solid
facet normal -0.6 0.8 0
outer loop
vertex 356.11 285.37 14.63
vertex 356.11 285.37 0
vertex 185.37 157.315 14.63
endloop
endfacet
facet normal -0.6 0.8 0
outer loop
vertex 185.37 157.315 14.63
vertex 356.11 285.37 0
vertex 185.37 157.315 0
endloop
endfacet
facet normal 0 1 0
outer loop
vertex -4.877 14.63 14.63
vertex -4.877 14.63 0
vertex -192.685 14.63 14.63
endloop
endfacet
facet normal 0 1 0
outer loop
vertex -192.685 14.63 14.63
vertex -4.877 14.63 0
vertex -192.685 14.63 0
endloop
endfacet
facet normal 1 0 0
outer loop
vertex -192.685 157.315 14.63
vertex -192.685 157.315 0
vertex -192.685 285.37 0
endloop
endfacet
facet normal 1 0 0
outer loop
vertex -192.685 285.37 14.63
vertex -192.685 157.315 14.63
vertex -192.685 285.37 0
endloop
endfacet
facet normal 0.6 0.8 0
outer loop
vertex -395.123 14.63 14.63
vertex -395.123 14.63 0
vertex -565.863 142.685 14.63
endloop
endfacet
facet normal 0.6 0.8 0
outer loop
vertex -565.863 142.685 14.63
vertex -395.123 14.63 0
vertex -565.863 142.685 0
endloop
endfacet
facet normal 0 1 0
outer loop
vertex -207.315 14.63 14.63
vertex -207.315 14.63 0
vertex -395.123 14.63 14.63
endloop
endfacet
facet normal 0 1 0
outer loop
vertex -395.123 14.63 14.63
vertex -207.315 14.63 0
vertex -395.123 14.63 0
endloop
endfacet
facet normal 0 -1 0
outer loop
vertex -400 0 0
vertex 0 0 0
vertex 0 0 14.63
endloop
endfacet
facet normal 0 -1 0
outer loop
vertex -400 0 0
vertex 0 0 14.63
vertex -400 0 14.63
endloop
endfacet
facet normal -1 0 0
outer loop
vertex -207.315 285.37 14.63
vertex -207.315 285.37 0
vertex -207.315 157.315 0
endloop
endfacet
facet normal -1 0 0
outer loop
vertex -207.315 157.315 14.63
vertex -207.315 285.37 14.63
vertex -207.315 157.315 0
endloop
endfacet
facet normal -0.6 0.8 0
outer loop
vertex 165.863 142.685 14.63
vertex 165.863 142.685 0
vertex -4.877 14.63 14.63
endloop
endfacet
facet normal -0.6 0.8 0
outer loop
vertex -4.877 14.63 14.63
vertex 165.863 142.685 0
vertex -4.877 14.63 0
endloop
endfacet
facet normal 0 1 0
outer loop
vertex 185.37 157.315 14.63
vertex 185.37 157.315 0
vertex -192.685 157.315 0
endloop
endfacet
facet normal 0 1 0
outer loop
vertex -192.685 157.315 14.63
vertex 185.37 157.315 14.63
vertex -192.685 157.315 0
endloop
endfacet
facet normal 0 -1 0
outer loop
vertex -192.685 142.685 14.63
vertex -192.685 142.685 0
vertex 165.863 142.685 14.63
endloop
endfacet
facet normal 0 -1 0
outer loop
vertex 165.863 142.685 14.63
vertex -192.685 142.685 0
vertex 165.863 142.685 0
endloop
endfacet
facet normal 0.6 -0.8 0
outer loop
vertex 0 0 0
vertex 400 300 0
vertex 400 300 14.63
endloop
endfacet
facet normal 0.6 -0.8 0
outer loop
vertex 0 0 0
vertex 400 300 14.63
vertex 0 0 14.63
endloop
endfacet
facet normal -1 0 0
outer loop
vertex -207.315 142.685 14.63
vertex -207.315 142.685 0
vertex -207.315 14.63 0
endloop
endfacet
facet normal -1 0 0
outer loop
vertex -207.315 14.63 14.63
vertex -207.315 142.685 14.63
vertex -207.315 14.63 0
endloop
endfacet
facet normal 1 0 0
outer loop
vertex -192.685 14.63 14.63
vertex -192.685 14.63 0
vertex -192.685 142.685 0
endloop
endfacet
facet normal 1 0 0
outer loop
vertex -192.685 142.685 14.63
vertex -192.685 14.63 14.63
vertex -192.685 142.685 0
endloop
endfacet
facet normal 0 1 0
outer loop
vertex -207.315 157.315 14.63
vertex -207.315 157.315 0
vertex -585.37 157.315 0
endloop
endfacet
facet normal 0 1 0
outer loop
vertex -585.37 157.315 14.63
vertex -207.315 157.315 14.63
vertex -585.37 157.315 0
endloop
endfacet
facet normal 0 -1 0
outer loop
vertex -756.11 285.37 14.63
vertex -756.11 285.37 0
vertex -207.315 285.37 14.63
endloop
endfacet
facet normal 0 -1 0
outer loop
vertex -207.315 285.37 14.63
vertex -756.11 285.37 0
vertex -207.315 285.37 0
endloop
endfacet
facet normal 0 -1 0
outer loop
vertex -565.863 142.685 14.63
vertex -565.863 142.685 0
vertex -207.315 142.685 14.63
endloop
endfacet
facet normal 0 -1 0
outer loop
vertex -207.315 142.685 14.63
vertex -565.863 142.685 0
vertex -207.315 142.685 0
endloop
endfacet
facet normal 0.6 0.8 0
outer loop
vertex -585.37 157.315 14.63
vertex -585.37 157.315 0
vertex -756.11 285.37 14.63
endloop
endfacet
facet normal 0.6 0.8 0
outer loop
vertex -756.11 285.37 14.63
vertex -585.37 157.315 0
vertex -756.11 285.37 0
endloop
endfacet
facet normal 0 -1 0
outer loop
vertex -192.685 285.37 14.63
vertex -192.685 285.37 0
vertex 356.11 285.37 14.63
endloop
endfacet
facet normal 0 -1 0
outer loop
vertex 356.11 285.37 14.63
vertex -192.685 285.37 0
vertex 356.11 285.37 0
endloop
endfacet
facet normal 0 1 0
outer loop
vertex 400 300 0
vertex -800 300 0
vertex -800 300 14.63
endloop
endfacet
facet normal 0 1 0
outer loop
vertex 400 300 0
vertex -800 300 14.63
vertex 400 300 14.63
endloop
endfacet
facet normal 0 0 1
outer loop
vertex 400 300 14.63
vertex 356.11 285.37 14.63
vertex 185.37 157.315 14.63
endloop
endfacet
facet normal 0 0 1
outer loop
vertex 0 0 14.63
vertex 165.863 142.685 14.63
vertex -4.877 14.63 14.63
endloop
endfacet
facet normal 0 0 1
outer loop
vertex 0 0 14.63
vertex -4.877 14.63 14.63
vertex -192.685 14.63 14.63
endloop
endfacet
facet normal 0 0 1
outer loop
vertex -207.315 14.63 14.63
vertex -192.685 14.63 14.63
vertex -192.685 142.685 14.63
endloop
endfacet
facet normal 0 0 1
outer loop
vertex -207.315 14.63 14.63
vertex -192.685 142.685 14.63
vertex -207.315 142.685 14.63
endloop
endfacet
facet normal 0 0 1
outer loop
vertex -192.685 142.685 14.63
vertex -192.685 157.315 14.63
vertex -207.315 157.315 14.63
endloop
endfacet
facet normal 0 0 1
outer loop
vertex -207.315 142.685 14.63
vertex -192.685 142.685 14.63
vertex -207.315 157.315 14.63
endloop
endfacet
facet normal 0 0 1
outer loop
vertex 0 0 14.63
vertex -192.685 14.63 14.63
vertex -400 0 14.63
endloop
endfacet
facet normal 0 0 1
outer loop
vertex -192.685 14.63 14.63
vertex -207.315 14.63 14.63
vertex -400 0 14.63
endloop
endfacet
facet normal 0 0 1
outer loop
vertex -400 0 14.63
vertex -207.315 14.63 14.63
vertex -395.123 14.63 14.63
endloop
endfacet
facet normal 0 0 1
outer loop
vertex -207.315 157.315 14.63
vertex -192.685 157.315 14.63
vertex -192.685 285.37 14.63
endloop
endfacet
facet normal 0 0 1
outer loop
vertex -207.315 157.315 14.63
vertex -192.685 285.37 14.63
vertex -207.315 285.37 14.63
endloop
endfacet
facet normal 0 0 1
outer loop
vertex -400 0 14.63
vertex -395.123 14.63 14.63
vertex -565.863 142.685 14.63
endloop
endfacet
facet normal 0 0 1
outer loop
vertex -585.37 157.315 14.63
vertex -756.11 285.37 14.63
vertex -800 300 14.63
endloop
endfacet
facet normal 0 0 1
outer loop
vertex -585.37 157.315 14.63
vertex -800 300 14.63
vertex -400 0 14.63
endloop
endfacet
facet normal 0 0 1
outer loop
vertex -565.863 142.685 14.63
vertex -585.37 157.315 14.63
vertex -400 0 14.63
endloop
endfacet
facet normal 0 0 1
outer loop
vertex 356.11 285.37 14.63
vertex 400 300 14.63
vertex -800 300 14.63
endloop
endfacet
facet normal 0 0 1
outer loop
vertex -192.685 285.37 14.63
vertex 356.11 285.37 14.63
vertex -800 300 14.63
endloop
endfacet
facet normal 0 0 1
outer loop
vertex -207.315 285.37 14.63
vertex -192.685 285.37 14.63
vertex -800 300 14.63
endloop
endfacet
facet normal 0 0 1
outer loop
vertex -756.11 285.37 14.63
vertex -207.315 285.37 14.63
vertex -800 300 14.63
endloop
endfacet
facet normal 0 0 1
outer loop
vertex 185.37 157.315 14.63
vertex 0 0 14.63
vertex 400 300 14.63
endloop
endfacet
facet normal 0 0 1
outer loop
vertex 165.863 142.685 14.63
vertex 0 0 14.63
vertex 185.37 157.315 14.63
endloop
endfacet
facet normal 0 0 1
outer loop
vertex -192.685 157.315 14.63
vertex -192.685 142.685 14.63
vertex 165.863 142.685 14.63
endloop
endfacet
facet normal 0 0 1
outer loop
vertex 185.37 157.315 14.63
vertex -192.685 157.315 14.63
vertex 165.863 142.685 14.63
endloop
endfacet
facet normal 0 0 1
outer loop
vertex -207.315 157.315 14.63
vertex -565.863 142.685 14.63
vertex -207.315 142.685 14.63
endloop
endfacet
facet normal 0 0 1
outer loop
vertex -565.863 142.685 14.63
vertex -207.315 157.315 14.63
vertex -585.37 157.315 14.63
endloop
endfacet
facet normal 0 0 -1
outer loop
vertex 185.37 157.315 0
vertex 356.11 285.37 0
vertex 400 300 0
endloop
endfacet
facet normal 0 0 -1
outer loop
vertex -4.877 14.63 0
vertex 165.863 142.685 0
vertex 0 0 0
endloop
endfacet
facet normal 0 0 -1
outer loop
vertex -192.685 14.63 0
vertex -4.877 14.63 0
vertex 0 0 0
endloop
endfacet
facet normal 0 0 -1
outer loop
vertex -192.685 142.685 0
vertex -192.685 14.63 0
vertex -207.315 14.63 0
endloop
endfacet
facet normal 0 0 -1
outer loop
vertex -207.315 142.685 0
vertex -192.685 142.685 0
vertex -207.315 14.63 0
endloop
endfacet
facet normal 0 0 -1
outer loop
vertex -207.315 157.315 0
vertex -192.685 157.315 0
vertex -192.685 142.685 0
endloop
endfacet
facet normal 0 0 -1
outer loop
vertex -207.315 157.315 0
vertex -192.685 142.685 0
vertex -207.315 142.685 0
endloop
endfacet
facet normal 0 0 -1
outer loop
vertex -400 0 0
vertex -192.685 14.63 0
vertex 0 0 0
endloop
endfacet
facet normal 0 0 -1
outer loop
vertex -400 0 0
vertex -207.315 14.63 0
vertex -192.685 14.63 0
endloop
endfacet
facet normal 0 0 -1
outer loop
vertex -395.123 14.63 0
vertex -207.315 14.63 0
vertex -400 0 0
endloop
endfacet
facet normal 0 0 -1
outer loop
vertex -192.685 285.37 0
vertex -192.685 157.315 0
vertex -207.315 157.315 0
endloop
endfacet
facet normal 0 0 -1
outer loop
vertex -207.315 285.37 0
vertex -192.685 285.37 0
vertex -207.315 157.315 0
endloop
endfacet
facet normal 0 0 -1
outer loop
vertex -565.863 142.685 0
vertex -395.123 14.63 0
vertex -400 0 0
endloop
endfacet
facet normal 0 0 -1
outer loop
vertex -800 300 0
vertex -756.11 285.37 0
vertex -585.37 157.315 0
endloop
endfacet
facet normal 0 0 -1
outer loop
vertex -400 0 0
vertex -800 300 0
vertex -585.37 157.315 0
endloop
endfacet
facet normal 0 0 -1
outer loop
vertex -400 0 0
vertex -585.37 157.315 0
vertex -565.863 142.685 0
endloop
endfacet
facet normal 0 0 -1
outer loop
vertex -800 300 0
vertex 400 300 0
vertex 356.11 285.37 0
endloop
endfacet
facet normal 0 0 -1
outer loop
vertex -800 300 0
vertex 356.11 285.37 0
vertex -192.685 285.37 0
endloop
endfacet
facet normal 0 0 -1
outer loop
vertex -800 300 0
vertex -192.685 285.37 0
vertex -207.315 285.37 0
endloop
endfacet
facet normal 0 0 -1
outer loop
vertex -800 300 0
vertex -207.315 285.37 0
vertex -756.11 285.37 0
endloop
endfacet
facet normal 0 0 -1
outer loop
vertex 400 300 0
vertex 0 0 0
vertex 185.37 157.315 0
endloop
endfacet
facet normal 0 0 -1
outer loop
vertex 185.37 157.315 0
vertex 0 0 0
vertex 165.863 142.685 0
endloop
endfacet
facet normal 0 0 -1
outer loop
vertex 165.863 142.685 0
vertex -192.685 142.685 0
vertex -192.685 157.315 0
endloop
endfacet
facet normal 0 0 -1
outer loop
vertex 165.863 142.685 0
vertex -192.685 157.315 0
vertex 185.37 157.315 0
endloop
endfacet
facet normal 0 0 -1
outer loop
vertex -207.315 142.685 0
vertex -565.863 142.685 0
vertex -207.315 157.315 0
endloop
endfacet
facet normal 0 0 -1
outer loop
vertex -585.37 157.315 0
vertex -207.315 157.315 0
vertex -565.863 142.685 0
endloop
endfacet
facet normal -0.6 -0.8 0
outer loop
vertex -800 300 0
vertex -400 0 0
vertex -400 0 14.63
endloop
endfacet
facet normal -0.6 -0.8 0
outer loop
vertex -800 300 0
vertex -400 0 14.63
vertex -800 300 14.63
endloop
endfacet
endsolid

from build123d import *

# Parameters (mm, degrees)
BOSS_EXTRUDE2_DEPTH = 14.63


with BuildPart() as part:
    # Sketch1 → Boss-Extrude2 (new body)
    with BuildSketch(Plane.XY):
        Polygon((0, 0), (-400, 0), (-800, 300), (400, 300), align=None)
        Polygon((-585.37, 157.315), (-756.11, 285.37), (-207.315, 285.37), (-207.315, 157.315), (-575.616666667, 157.315), align=None, mode=Mode.SUBTRACT)
        Polygon((-565.863333333, 142.685), (-207.315, 142.685), (-207.315, 14.63), (-395.123333333, 14.63), align=None, mode=Mode.SUBTRACT)
        Polygon((356.11, 285.37), (185.37, 157.315), (175.161951027, 157.315), (-192.685, 157.315), (-192.685, 285.37), align=None, mode=Mode.SUBTRACT)
        Polygon((-4.876666667, 14.63), (-192.685, 14.63), (-192.685, 142.685), (165.863333333, 142.685), align=None, mode=Mode.SUBTRACT)
    extrude(amount=BOSS_EXTRUDE2_DEPTH)


solid = part.part
